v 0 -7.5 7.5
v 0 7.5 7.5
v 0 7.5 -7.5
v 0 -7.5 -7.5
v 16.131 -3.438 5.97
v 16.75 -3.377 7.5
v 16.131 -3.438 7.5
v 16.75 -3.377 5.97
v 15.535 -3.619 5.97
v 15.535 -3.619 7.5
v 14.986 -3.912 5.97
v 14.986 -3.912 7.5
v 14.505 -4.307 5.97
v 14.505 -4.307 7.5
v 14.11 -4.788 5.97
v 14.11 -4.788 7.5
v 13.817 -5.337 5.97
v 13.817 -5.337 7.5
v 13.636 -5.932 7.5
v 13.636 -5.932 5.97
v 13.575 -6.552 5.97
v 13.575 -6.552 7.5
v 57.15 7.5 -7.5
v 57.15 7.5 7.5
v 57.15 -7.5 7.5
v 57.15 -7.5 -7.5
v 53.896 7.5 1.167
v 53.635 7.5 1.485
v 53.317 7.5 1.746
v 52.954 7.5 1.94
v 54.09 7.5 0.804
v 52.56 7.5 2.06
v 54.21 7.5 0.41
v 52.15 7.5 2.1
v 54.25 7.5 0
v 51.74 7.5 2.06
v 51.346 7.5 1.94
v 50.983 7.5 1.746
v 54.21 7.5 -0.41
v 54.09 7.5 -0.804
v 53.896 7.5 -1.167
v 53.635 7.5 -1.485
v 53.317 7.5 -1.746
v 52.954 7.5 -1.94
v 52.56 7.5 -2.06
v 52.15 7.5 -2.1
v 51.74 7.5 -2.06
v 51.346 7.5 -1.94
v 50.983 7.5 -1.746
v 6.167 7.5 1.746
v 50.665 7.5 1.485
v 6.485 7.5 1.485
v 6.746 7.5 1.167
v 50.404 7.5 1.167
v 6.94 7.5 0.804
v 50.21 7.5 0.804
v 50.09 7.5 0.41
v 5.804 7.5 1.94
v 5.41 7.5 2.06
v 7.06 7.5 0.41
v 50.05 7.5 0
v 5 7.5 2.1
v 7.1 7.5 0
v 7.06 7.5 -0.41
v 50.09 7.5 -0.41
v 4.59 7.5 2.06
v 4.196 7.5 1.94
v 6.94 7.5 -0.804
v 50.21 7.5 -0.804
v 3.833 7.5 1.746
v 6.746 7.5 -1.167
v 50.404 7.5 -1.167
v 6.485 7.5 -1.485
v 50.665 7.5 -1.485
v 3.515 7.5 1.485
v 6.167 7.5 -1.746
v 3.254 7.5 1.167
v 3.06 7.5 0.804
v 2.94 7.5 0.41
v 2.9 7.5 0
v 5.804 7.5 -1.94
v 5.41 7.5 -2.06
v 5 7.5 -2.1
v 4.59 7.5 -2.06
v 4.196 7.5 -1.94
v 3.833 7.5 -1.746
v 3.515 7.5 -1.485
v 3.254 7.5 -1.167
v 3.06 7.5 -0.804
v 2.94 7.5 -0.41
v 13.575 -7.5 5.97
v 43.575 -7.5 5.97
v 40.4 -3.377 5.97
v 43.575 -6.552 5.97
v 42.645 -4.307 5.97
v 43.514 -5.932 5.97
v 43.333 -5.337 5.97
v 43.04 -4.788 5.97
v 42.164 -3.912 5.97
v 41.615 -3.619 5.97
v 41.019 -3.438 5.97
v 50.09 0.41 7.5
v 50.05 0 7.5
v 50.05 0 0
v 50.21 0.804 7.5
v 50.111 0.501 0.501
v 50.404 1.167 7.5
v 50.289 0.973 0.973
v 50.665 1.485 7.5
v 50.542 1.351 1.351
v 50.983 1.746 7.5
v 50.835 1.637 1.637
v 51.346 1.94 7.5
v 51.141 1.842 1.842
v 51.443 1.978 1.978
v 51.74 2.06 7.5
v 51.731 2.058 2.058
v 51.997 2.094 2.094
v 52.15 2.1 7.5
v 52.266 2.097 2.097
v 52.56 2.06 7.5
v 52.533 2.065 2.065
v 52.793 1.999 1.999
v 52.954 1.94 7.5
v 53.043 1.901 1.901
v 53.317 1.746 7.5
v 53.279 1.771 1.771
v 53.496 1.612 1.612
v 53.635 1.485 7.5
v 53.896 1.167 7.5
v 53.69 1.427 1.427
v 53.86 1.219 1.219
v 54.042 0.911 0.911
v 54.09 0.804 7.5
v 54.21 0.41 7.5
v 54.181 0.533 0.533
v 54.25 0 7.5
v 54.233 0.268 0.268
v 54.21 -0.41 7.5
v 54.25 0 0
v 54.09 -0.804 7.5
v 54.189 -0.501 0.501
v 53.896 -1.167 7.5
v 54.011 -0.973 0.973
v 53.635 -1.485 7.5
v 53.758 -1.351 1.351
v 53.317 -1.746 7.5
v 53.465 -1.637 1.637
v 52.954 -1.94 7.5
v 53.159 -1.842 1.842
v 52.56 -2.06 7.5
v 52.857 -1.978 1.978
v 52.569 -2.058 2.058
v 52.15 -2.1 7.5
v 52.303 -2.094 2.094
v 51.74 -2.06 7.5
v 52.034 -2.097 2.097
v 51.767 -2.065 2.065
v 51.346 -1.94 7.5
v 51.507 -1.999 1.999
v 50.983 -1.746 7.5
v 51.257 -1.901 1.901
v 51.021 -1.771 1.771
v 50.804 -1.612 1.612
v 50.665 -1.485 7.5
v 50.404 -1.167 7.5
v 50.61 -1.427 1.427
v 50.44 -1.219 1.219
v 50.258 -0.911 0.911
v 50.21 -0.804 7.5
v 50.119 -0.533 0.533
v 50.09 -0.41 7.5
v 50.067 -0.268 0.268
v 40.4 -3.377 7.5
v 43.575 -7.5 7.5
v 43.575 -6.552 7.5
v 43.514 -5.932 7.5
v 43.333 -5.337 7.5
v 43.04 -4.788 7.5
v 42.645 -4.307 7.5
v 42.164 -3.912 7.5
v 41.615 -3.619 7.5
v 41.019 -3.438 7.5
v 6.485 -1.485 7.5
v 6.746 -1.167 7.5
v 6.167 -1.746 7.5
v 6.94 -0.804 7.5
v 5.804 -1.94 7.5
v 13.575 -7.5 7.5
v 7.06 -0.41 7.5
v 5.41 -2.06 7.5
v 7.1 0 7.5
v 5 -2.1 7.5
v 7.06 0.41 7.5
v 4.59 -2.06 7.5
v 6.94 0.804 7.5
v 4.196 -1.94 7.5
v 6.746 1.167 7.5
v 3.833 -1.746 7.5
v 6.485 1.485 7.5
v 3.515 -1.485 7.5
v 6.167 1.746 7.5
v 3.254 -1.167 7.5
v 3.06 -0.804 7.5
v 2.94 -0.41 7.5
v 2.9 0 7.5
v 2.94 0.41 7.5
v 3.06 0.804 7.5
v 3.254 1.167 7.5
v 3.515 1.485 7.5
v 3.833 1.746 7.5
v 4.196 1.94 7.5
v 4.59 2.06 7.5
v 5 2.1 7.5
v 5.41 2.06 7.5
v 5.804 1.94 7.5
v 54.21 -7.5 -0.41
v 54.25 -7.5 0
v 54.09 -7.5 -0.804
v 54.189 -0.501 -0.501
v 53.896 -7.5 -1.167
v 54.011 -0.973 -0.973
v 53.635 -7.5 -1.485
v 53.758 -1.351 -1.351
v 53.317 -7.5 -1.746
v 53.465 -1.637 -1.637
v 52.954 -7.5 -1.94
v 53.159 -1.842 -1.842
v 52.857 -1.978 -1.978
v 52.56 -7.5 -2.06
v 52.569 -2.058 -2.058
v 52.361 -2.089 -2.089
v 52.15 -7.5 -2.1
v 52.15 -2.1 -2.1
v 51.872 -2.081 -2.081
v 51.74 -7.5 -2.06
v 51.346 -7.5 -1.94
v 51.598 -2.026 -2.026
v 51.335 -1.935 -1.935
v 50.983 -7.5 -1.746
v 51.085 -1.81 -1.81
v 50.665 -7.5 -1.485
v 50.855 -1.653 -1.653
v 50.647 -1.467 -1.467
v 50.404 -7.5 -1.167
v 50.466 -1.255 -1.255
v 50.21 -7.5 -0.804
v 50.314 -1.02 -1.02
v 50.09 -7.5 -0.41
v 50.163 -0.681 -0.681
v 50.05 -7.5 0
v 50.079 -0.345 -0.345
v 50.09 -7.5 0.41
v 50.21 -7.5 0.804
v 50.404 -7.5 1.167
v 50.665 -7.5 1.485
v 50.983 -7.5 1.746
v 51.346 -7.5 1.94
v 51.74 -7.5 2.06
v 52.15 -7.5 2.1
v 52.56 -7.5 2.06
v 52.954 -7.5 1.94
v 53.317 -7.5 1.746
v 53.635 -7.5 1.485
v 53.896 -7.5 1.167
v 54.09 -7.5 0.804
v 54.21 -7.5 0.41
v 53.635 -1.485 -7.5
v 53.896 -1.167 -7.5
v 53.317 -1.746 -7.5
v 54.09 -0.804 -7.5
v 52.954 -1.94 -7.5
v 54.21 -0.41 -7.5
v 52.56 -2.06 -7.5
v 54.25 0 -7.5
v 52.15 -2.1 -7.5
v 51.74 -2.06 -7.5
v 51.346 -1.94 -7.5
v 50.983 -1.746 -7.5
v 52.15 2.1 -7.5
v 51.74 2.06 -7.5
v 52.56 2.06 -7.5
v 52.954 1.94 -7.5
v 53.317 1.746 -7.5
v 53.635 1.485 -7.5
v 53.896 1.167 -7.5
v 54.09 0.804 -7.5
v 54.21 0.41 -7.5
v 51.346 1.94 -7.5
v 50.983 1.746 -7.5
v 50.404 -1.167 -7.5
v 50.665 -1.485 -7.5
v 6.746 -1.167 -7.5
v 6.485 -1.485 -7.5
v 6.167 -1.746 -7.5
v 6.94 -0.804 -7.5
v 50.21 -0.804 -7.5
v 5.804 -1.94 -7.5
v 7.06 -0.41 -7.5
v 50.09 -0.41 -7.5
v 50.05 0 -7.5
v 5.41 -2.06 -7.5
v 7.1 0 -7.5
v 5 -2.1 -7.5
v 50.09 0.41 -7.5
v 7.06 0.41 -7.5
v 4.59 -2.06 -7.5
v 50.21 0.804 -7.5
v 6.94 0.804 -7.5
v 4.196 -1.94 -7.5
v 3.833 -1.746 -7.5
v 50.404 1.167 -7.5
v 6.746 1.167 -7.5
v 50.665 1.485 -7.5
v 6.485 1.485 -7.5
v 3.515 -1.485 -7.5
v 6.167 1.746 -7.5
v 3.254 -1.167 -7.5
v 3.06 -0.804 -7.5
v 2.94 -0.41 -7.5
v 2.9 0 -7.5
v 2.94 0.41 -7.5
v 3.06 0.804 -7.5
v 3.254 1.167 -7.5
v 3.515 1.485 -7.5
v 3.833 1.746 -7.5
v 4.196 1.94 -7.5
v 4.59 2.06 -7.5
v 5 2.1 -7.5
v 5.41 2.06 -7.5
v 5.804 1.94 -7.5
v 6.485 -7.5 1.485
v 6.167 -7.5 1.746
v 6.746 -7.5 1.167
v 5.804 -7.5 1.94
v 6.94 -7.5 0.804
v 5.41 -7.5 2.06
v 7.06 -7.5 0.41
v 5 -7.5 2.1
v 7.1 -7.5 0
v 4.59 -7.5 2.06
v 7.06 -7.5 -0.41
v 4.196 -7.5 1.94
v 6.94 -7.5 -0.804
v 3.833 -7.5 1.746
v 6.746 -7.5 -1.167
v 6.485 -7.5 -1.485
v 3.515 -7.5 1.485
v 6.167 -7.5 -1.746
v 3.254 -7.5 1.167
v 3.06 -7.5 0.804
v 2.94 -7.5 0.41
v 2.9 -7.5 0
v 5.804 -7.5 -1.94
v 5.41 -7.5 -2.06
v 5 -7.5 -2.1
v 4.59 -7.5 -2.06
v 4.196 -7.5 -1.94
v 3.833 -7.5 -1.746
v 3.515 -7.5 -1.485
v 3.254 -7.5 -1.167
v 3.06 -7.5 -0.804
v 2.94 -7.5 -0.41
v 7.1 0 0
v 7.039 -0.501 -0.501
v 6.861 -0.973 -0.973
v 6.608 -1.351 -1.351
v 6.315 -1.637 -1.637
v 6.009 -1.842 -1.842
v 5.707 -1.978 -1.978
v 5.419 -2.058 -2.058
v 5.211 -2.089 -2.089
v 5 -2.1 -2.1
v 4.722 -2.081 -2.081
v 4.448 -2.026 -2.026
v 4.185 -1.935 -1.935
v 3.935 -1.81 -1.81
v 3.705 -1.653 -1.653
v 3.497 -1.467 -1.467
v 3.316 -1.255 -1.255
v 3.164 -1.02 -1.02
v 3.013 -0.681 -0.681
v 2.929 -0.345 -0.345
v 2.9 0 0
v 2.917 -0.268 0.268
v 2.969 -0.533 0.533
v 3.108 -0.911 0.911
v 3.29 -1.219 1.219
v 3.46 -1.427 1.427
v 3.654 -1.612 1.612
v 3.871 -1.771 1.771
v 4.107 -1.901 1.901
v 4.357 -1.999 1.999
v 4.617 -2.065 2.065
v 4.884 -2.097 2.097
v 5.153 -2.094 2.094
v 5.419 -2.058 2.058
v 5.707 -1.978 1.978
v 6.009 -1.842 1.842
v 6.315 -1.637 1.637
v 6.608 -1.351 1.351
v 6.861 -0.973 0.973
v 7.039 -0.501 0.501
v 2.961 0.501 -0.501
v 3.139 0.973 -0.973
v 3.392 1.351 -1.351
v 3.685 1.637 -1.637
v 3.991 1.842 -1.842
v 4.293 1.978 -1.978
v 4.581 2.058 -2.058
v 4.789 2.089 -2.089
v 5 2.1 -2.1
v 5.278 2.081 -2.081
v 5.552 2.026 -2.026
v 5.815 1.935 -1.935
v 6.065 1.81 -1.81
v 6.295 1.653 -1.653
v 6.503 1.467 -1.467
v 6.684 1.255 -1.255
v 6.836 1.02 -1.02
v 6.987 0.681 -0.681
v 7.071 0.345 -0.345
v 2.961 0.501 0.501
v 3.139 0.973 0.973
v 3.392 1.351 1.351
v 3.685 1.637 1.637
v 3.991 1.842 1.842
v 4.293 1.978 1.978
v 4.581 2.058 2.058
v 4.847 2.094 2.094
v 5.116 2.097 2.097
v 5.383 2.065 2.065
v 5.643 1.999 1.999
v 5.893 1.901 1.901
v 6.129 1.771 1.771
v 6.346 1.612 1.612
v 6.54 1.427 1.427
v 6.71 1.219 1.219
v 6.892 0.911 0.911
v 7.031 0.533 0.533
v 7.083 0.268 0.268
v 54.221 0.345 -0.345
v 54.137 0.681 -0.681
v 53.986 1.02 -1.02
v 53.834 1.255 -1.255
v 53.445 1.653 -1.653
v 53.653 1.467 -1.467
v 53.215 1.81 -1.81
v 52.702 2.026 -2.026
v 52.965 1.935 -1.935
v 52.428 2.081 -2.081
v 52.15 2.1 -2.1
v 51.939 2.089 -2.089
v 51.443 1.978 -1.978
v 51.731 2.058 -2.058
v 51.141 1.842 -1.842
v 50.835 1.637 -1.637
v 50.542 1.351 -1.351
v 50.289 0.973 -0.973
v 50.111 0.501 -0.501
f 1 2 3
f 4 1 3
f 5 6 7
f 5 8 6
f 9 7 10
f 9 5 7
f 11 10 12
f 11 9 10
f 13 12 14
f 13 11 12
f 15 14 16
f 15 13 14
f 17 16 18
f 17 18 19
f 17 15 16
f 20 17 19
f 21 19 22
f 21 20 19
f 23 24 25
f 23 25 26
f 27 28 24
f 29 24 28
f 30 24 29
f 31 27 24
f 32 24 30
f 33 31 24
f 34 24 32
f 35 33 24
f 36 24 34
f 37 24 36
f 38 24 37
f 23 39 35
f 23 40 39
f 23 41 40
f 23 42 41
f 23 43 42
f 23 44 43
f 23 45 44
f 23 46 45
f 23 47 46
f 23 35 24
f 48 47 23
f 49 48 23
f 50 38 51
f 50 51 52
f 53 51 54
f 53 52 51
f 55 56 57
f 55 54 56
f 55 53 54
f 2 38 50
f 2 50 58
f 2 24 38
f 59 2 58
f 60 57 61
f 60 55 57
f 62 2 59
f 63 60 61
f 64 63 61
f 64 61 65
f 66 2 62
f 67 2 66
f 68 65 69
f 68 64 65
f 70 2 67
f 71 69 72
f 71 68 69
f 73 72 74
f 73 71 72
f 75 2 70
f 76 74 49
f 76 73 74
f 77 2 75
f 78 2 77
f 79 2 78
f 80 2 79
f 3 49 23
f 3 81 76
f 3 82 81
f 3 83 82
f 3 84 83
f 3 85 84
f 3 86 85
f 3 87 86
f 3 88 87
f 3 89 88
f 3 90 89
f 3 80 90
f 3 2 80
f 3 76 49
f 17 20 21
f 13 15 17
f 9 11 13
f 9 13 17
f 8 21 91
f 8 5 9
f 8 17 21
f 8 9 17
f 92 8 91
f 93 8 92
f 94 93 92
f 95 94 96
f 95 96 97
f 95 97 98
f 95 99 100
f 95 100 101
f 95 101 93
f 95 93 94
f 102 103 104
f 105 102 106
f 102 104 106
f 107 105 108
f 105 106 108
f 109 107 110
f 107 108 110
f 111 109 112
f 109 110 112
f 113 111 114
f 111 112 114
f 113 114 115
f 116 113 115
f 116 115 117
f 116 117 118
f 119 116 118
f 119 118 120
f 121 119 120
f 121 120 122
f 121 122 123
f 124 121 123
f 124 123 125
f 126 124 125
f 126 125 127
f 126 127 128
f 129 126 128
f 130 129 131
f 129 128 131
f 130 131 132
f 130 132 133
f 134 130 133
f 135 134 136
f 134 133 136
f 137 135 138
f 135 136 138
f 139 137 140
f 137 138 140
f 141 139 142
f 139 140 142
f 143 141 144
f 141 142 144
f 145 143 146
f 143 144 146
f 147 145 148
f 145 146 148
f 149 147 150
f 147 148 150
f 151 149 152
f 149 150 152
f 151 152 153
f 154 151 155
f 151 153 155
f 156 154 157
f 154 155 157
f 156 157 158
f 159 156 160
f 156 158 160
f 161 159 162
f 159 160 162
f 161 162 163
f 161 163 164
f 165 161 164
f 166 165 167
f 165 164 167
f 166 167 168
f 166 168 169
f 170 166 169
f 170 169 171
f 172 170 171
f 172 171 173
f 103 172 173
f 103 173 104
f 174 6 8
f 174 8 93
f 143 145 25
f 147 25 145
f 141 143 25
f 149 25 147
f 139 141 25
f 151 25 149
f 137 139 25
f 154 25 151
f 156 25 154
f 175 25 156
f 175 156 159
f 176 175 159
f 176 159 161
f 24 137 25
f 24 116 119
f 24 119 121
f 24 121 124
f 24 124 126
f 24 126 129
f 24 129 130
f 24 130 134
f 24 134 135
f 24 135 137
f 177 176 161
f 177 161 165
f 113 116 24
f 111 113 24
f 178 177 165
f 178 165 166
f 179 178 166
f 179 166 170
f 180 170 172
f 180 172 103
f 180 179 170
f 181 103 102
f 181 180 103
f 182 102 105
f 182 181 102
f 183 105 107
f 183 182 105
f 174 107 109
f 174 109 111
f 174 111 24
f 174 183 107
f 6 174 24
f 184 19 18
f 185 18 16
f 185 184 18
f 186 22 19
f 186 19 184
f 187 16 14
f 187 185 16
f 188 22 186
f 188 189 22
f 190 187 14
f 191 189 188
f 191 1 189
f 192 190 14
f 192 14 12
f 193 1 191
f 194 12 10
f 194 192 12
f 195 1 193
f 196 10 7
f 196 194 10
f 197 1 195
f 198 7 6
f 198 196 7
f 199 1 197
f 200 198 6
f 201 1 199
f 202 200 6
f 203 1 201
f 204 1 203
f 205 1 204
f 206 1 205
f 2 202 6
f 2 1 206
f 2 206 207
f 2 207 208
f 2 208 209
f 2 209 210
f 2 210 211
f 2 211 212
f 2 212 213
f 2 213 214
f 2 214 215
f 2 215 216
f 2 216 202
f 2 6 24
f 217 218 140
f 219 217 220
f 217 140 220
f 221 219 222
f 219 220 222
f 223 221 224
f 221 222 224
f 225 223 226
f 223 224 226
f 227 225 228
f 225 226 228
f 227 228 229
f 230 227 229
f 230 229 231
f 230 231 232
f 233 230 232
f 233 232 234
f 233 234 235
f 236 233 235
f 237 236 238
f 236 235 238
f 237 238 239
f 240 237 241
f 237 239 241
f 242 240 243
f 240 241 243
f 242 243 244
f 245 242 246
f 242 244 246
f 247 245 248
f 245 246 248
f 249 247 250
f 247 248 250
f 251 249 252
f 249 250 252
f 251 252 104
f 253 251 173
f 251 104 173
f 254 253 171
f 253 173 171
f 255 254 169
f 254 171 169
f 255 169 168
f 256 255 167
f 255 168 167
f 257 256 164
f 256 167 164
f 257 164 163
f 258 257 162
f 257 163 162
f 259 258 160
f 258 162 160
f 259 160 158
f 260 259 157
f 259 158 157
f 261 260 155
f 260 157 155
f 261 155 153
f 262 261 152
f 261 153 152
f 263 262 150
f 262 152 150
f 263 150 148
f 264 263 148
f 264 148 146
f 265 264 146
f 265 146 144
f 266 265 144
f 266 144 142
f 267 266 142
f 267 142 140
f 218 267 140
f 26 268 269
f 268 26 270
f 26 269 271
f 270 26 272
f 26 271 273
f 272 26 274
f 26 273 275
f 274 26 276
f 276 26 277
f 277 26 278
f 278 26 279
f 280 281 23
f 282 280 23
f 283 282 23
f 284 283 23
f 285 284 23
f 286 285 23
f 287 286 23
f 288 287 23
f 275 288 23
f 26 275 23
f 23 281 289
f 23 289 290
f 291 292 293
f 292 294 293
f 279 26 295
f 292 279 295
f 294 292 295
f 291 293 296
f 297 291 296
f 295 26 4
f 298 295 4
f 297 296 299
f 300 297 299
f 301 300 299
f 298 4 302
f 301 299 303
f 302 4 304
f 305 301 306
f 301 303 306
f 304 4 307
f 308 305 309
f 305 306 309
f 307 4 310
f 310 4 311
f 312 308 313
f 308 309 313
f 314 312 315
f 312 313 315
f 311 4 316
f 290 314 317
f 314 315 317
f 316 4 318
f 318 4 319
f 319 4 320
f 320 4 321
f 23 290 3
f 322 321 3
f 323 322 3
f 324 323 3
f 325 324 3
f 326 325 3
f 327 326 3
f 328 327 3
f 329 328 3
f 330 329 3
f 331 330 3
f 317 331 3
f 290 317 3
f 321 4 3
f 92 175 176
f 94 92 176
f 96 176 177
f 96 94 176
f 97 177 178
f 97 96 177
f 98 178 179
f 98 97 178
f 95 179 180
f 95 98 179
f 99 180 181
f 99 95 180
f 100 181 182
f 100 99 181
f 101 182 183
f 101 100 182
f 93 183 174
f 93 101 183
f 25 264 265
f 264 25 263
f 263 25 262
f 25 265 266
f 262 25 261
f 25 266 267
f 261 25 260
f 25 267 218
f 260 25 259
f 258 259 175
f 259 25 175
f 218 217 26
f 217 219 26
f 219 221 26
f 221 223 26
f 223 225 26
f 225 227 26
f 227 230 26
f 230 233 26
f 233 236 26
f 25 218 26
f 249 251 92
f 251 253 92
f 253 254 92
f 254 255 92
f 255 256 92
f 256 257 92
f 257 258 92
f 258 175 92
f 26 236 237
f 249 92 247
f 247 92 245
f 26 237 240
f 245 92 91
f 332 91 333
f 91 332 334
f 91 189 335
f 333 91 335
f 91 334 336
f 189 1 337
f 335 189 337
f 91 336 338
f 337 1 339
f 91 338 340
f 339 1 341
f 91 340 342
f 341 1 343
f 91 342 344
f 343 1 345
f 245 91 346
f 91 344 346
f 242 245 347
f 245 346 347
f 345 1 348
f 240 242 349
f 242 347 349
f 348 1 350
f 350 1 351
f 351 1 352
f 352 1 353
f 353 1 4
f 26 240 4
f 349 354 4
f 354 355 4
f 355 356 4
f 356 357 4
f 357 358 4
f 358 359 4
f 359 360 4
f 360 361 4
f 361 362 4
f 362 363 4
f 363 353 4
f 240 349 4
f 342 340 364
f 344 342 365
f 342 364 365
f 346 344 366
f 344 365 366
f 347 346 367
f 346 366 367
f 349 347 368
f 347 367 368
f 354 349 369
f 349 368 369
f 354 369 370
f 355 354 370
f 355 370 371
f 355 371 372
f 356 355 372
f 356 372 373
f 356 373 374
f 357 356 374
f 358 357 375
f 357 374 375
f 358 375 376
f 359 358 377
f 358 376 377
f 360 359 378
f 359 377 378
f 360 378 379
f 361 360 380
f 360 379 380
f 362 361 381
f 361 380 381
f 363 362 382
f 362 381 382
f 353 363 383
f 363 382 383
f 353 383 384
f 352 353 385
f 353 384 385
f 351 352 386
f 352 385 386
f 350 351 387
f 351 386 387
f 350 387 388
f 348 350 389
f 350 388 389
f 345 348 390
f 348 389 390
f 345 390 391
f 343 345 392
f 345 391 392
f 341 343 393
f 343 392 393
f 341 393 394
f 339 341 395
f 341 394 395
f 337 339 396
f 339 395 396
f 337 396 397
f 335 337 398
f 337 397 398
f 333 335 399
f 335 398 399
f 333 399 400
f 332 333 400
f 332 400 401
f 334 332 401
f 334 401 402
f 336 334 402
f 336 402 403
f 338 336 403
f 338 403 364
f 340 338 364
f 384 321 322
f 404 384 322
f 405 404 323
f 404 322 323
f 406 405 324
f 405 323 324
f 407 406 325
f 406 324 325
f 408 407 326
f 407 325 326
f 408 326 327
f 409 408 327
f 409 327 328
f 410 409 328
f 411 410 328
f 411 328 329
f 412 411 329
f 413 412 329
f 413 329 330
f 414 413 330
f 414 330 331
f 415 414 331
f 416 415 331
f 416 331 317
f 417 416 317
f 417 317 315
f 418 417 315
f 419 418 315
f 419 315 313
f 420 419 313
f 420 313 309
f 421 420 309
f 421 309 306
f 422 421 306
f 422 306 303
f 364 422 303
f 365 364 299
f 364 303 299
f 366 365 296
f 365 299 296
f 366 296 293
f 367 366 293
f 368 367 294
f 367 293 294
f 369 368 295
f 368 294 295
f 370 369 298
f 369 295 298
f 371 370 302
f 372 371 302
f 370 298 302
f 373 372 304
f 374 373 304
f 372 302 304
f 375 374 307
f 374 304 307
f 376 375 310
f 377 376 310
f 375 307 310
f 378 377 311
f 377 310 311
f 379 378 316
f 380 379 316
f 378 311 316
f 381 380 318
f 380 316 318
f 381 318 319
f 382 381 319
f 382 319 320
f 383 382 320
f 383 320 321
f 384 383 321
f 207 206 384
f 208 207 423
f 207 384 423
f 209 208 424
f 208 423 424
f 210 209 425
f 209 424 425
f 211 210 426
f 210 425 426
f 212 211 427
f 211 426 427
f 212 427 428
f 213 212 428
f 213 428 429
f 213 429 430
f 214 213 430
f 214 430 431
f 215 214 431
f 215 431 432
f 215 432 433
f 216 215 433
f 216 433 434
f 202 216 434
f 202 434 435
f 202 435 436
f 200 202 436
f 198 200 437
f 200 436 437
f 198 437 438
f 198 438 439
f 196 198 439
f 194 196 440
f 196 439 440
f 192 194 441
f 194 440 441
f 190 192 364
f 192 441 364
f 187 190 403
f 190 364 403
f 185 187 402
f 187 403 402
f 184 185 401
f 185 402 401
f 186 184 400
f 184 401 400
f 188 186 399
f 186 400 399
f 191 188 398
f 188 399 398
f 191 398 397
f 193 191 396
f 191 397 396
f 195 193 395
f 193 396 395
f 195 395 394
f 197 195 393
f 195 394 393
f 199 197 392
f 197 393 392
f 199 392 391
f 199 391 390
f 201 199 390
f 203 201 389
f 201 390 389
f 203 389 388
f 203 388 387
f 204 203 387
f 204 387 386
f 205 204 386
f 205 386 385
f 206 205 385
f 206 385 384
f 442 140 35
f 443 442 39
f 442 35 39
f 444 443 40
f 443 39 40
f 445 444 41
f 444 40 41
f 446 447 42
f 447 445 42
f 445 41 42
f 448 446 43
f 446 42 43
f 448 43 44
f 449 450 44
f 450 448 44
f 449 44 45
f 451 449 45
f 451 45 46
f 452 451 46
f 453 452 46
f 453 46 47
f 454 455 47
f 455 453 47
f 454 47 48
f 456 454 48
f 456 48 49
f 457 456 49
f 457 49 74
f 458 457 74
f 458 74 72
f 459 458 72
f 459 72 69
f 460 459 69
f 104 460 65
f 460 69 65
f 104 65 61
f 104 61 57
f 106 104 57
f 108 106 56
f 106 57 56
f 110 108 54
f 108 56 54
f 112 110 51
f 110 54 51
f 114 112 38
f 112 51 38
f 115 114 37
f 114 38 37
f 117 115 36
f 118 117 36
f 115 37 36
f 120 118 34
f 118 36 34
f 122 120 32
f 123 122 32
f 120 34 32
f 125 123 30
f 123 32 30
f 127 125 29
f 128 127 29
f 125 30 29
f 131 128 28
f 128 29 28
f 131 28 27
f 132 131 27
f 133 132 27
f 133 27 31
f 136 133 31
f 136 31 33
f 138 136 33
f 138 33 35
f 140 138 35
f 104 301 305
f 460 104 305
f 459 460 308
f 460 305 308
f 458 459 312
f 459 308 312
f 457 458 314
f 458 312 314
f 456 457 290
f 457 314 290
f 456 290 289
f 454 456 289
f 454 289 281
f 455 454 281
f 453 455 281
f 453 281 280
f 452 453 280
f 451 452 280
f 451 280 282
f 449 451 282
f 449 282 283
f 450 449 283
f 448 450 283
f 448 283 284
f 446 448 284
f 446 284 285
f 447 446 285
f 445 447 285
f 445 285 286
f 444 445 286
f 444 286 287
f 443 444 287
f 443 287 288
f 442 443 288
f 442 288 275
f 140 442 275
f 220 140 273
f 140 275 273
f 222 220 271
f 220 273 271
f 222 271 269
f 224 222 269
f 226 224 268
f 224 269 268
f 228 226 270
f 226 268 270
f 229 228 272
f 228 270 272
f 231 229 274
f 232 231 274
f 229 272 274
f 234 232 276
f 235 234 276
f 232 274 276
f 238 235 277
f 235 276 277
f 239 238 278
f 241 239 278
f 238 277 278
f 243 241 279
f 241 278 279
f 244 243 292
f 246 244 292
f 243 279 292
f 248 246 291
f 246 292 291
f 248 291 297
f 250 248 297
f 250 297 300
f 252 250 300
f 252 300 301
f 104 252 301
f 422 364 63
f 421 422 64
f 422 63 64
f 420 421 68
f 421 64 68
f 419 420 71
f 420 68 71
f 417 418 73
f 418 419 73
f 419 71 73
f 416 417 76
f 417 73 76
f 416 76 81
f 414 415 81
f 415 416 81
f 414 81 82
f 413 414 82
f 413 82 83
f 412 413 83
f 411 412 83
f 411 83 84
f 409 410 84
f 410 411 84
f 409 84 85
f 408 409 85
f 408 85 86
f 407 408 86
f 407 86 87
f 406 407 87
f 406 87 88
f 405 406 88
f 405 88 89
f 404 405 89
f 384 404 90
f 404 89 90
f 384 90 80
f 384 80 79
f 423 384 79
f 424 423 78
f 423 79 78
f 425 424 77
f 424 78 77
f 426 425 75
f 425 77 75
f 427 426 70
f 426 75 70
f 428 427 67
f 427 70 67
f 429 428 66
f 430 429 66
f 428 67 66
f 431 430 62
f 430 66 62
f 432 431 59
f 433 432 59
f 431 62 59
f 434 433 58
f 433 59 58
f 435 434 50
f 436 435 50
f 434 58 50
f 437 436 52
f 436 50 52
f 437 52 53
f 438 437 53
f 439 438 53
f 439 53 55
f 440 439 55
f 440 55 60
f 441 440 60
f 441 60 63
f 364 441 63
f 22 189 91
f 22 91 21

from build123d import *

# Parameters (mm, degrees)
SKETCH1_W             = 15
SKETCH1_H             = 15
BOSS_EXTRUDE1_DEPTH   = 57.15
M5X0_8_TAPPED_HOLE1_D = 4.2
M5X0_8_TAPPED_HOLE2_D = 4.2
SKETCH12_W            = 30
SKETCH12_H            = 8.246203466
CUT_EXTRUDE2_DEPTH    = 1.53
FILLET2_R             = 3.175


with BuildPart() as part:
    # Sketch1 → Boss-Extrude1 (new body)
    with BuildSketch(Plane(origin=(0, 0, 0), x_dir=(0, 0, -1), z_dir=(1, 0, 0))):
        Rectangle(SKETCH1_W, SKETCH1_H)
    extrude(amount=BOSS_EXTRUDE1_DEPTH)

    # M5x0.8 Tapped Hole1 (through all)
    with Locations(Plane.XY.offset(7.5)):
        with Locations((5, 0), (52.15, 0)):
            Hole(M5X0_8_TAPPED_HOLE1_D / 2)

    # M5x0.8 Tapped Hole2 (through all)
    with Locations(Plane(origin=(0, -7.5, 0), x_dir=(-1, 0, 0), z_dir=(0, -1, 0))):
        with Locations((-5, 0), (-52.15, 0)):
            Hole(M5X0_8_TAPPED_HOLE2_D / 2)

    # Sketch12 → Cut-Extrude2 (cut)
    with BuildSketch(Plane.XY.offset(7.5)):
        with Locations((28.575, -7.5)):
            Rectangle(SKETCH12_W, SKETCH12_H)
    extrude(amount=-CUT_EXTRUDE2_DEPTH, mode=Mode.SUBTRACT)

    # Fillet2
    fillet2_edges = [part.edges().sort_by_distance(p)[0] for p in [
        (43.575, -3.376898267, 6.735),
        (13.575, -3.376898267, 6.735),
    ]]
    fillet(fillet2_edges, radius=FILLET2_R)


solid = part.part
